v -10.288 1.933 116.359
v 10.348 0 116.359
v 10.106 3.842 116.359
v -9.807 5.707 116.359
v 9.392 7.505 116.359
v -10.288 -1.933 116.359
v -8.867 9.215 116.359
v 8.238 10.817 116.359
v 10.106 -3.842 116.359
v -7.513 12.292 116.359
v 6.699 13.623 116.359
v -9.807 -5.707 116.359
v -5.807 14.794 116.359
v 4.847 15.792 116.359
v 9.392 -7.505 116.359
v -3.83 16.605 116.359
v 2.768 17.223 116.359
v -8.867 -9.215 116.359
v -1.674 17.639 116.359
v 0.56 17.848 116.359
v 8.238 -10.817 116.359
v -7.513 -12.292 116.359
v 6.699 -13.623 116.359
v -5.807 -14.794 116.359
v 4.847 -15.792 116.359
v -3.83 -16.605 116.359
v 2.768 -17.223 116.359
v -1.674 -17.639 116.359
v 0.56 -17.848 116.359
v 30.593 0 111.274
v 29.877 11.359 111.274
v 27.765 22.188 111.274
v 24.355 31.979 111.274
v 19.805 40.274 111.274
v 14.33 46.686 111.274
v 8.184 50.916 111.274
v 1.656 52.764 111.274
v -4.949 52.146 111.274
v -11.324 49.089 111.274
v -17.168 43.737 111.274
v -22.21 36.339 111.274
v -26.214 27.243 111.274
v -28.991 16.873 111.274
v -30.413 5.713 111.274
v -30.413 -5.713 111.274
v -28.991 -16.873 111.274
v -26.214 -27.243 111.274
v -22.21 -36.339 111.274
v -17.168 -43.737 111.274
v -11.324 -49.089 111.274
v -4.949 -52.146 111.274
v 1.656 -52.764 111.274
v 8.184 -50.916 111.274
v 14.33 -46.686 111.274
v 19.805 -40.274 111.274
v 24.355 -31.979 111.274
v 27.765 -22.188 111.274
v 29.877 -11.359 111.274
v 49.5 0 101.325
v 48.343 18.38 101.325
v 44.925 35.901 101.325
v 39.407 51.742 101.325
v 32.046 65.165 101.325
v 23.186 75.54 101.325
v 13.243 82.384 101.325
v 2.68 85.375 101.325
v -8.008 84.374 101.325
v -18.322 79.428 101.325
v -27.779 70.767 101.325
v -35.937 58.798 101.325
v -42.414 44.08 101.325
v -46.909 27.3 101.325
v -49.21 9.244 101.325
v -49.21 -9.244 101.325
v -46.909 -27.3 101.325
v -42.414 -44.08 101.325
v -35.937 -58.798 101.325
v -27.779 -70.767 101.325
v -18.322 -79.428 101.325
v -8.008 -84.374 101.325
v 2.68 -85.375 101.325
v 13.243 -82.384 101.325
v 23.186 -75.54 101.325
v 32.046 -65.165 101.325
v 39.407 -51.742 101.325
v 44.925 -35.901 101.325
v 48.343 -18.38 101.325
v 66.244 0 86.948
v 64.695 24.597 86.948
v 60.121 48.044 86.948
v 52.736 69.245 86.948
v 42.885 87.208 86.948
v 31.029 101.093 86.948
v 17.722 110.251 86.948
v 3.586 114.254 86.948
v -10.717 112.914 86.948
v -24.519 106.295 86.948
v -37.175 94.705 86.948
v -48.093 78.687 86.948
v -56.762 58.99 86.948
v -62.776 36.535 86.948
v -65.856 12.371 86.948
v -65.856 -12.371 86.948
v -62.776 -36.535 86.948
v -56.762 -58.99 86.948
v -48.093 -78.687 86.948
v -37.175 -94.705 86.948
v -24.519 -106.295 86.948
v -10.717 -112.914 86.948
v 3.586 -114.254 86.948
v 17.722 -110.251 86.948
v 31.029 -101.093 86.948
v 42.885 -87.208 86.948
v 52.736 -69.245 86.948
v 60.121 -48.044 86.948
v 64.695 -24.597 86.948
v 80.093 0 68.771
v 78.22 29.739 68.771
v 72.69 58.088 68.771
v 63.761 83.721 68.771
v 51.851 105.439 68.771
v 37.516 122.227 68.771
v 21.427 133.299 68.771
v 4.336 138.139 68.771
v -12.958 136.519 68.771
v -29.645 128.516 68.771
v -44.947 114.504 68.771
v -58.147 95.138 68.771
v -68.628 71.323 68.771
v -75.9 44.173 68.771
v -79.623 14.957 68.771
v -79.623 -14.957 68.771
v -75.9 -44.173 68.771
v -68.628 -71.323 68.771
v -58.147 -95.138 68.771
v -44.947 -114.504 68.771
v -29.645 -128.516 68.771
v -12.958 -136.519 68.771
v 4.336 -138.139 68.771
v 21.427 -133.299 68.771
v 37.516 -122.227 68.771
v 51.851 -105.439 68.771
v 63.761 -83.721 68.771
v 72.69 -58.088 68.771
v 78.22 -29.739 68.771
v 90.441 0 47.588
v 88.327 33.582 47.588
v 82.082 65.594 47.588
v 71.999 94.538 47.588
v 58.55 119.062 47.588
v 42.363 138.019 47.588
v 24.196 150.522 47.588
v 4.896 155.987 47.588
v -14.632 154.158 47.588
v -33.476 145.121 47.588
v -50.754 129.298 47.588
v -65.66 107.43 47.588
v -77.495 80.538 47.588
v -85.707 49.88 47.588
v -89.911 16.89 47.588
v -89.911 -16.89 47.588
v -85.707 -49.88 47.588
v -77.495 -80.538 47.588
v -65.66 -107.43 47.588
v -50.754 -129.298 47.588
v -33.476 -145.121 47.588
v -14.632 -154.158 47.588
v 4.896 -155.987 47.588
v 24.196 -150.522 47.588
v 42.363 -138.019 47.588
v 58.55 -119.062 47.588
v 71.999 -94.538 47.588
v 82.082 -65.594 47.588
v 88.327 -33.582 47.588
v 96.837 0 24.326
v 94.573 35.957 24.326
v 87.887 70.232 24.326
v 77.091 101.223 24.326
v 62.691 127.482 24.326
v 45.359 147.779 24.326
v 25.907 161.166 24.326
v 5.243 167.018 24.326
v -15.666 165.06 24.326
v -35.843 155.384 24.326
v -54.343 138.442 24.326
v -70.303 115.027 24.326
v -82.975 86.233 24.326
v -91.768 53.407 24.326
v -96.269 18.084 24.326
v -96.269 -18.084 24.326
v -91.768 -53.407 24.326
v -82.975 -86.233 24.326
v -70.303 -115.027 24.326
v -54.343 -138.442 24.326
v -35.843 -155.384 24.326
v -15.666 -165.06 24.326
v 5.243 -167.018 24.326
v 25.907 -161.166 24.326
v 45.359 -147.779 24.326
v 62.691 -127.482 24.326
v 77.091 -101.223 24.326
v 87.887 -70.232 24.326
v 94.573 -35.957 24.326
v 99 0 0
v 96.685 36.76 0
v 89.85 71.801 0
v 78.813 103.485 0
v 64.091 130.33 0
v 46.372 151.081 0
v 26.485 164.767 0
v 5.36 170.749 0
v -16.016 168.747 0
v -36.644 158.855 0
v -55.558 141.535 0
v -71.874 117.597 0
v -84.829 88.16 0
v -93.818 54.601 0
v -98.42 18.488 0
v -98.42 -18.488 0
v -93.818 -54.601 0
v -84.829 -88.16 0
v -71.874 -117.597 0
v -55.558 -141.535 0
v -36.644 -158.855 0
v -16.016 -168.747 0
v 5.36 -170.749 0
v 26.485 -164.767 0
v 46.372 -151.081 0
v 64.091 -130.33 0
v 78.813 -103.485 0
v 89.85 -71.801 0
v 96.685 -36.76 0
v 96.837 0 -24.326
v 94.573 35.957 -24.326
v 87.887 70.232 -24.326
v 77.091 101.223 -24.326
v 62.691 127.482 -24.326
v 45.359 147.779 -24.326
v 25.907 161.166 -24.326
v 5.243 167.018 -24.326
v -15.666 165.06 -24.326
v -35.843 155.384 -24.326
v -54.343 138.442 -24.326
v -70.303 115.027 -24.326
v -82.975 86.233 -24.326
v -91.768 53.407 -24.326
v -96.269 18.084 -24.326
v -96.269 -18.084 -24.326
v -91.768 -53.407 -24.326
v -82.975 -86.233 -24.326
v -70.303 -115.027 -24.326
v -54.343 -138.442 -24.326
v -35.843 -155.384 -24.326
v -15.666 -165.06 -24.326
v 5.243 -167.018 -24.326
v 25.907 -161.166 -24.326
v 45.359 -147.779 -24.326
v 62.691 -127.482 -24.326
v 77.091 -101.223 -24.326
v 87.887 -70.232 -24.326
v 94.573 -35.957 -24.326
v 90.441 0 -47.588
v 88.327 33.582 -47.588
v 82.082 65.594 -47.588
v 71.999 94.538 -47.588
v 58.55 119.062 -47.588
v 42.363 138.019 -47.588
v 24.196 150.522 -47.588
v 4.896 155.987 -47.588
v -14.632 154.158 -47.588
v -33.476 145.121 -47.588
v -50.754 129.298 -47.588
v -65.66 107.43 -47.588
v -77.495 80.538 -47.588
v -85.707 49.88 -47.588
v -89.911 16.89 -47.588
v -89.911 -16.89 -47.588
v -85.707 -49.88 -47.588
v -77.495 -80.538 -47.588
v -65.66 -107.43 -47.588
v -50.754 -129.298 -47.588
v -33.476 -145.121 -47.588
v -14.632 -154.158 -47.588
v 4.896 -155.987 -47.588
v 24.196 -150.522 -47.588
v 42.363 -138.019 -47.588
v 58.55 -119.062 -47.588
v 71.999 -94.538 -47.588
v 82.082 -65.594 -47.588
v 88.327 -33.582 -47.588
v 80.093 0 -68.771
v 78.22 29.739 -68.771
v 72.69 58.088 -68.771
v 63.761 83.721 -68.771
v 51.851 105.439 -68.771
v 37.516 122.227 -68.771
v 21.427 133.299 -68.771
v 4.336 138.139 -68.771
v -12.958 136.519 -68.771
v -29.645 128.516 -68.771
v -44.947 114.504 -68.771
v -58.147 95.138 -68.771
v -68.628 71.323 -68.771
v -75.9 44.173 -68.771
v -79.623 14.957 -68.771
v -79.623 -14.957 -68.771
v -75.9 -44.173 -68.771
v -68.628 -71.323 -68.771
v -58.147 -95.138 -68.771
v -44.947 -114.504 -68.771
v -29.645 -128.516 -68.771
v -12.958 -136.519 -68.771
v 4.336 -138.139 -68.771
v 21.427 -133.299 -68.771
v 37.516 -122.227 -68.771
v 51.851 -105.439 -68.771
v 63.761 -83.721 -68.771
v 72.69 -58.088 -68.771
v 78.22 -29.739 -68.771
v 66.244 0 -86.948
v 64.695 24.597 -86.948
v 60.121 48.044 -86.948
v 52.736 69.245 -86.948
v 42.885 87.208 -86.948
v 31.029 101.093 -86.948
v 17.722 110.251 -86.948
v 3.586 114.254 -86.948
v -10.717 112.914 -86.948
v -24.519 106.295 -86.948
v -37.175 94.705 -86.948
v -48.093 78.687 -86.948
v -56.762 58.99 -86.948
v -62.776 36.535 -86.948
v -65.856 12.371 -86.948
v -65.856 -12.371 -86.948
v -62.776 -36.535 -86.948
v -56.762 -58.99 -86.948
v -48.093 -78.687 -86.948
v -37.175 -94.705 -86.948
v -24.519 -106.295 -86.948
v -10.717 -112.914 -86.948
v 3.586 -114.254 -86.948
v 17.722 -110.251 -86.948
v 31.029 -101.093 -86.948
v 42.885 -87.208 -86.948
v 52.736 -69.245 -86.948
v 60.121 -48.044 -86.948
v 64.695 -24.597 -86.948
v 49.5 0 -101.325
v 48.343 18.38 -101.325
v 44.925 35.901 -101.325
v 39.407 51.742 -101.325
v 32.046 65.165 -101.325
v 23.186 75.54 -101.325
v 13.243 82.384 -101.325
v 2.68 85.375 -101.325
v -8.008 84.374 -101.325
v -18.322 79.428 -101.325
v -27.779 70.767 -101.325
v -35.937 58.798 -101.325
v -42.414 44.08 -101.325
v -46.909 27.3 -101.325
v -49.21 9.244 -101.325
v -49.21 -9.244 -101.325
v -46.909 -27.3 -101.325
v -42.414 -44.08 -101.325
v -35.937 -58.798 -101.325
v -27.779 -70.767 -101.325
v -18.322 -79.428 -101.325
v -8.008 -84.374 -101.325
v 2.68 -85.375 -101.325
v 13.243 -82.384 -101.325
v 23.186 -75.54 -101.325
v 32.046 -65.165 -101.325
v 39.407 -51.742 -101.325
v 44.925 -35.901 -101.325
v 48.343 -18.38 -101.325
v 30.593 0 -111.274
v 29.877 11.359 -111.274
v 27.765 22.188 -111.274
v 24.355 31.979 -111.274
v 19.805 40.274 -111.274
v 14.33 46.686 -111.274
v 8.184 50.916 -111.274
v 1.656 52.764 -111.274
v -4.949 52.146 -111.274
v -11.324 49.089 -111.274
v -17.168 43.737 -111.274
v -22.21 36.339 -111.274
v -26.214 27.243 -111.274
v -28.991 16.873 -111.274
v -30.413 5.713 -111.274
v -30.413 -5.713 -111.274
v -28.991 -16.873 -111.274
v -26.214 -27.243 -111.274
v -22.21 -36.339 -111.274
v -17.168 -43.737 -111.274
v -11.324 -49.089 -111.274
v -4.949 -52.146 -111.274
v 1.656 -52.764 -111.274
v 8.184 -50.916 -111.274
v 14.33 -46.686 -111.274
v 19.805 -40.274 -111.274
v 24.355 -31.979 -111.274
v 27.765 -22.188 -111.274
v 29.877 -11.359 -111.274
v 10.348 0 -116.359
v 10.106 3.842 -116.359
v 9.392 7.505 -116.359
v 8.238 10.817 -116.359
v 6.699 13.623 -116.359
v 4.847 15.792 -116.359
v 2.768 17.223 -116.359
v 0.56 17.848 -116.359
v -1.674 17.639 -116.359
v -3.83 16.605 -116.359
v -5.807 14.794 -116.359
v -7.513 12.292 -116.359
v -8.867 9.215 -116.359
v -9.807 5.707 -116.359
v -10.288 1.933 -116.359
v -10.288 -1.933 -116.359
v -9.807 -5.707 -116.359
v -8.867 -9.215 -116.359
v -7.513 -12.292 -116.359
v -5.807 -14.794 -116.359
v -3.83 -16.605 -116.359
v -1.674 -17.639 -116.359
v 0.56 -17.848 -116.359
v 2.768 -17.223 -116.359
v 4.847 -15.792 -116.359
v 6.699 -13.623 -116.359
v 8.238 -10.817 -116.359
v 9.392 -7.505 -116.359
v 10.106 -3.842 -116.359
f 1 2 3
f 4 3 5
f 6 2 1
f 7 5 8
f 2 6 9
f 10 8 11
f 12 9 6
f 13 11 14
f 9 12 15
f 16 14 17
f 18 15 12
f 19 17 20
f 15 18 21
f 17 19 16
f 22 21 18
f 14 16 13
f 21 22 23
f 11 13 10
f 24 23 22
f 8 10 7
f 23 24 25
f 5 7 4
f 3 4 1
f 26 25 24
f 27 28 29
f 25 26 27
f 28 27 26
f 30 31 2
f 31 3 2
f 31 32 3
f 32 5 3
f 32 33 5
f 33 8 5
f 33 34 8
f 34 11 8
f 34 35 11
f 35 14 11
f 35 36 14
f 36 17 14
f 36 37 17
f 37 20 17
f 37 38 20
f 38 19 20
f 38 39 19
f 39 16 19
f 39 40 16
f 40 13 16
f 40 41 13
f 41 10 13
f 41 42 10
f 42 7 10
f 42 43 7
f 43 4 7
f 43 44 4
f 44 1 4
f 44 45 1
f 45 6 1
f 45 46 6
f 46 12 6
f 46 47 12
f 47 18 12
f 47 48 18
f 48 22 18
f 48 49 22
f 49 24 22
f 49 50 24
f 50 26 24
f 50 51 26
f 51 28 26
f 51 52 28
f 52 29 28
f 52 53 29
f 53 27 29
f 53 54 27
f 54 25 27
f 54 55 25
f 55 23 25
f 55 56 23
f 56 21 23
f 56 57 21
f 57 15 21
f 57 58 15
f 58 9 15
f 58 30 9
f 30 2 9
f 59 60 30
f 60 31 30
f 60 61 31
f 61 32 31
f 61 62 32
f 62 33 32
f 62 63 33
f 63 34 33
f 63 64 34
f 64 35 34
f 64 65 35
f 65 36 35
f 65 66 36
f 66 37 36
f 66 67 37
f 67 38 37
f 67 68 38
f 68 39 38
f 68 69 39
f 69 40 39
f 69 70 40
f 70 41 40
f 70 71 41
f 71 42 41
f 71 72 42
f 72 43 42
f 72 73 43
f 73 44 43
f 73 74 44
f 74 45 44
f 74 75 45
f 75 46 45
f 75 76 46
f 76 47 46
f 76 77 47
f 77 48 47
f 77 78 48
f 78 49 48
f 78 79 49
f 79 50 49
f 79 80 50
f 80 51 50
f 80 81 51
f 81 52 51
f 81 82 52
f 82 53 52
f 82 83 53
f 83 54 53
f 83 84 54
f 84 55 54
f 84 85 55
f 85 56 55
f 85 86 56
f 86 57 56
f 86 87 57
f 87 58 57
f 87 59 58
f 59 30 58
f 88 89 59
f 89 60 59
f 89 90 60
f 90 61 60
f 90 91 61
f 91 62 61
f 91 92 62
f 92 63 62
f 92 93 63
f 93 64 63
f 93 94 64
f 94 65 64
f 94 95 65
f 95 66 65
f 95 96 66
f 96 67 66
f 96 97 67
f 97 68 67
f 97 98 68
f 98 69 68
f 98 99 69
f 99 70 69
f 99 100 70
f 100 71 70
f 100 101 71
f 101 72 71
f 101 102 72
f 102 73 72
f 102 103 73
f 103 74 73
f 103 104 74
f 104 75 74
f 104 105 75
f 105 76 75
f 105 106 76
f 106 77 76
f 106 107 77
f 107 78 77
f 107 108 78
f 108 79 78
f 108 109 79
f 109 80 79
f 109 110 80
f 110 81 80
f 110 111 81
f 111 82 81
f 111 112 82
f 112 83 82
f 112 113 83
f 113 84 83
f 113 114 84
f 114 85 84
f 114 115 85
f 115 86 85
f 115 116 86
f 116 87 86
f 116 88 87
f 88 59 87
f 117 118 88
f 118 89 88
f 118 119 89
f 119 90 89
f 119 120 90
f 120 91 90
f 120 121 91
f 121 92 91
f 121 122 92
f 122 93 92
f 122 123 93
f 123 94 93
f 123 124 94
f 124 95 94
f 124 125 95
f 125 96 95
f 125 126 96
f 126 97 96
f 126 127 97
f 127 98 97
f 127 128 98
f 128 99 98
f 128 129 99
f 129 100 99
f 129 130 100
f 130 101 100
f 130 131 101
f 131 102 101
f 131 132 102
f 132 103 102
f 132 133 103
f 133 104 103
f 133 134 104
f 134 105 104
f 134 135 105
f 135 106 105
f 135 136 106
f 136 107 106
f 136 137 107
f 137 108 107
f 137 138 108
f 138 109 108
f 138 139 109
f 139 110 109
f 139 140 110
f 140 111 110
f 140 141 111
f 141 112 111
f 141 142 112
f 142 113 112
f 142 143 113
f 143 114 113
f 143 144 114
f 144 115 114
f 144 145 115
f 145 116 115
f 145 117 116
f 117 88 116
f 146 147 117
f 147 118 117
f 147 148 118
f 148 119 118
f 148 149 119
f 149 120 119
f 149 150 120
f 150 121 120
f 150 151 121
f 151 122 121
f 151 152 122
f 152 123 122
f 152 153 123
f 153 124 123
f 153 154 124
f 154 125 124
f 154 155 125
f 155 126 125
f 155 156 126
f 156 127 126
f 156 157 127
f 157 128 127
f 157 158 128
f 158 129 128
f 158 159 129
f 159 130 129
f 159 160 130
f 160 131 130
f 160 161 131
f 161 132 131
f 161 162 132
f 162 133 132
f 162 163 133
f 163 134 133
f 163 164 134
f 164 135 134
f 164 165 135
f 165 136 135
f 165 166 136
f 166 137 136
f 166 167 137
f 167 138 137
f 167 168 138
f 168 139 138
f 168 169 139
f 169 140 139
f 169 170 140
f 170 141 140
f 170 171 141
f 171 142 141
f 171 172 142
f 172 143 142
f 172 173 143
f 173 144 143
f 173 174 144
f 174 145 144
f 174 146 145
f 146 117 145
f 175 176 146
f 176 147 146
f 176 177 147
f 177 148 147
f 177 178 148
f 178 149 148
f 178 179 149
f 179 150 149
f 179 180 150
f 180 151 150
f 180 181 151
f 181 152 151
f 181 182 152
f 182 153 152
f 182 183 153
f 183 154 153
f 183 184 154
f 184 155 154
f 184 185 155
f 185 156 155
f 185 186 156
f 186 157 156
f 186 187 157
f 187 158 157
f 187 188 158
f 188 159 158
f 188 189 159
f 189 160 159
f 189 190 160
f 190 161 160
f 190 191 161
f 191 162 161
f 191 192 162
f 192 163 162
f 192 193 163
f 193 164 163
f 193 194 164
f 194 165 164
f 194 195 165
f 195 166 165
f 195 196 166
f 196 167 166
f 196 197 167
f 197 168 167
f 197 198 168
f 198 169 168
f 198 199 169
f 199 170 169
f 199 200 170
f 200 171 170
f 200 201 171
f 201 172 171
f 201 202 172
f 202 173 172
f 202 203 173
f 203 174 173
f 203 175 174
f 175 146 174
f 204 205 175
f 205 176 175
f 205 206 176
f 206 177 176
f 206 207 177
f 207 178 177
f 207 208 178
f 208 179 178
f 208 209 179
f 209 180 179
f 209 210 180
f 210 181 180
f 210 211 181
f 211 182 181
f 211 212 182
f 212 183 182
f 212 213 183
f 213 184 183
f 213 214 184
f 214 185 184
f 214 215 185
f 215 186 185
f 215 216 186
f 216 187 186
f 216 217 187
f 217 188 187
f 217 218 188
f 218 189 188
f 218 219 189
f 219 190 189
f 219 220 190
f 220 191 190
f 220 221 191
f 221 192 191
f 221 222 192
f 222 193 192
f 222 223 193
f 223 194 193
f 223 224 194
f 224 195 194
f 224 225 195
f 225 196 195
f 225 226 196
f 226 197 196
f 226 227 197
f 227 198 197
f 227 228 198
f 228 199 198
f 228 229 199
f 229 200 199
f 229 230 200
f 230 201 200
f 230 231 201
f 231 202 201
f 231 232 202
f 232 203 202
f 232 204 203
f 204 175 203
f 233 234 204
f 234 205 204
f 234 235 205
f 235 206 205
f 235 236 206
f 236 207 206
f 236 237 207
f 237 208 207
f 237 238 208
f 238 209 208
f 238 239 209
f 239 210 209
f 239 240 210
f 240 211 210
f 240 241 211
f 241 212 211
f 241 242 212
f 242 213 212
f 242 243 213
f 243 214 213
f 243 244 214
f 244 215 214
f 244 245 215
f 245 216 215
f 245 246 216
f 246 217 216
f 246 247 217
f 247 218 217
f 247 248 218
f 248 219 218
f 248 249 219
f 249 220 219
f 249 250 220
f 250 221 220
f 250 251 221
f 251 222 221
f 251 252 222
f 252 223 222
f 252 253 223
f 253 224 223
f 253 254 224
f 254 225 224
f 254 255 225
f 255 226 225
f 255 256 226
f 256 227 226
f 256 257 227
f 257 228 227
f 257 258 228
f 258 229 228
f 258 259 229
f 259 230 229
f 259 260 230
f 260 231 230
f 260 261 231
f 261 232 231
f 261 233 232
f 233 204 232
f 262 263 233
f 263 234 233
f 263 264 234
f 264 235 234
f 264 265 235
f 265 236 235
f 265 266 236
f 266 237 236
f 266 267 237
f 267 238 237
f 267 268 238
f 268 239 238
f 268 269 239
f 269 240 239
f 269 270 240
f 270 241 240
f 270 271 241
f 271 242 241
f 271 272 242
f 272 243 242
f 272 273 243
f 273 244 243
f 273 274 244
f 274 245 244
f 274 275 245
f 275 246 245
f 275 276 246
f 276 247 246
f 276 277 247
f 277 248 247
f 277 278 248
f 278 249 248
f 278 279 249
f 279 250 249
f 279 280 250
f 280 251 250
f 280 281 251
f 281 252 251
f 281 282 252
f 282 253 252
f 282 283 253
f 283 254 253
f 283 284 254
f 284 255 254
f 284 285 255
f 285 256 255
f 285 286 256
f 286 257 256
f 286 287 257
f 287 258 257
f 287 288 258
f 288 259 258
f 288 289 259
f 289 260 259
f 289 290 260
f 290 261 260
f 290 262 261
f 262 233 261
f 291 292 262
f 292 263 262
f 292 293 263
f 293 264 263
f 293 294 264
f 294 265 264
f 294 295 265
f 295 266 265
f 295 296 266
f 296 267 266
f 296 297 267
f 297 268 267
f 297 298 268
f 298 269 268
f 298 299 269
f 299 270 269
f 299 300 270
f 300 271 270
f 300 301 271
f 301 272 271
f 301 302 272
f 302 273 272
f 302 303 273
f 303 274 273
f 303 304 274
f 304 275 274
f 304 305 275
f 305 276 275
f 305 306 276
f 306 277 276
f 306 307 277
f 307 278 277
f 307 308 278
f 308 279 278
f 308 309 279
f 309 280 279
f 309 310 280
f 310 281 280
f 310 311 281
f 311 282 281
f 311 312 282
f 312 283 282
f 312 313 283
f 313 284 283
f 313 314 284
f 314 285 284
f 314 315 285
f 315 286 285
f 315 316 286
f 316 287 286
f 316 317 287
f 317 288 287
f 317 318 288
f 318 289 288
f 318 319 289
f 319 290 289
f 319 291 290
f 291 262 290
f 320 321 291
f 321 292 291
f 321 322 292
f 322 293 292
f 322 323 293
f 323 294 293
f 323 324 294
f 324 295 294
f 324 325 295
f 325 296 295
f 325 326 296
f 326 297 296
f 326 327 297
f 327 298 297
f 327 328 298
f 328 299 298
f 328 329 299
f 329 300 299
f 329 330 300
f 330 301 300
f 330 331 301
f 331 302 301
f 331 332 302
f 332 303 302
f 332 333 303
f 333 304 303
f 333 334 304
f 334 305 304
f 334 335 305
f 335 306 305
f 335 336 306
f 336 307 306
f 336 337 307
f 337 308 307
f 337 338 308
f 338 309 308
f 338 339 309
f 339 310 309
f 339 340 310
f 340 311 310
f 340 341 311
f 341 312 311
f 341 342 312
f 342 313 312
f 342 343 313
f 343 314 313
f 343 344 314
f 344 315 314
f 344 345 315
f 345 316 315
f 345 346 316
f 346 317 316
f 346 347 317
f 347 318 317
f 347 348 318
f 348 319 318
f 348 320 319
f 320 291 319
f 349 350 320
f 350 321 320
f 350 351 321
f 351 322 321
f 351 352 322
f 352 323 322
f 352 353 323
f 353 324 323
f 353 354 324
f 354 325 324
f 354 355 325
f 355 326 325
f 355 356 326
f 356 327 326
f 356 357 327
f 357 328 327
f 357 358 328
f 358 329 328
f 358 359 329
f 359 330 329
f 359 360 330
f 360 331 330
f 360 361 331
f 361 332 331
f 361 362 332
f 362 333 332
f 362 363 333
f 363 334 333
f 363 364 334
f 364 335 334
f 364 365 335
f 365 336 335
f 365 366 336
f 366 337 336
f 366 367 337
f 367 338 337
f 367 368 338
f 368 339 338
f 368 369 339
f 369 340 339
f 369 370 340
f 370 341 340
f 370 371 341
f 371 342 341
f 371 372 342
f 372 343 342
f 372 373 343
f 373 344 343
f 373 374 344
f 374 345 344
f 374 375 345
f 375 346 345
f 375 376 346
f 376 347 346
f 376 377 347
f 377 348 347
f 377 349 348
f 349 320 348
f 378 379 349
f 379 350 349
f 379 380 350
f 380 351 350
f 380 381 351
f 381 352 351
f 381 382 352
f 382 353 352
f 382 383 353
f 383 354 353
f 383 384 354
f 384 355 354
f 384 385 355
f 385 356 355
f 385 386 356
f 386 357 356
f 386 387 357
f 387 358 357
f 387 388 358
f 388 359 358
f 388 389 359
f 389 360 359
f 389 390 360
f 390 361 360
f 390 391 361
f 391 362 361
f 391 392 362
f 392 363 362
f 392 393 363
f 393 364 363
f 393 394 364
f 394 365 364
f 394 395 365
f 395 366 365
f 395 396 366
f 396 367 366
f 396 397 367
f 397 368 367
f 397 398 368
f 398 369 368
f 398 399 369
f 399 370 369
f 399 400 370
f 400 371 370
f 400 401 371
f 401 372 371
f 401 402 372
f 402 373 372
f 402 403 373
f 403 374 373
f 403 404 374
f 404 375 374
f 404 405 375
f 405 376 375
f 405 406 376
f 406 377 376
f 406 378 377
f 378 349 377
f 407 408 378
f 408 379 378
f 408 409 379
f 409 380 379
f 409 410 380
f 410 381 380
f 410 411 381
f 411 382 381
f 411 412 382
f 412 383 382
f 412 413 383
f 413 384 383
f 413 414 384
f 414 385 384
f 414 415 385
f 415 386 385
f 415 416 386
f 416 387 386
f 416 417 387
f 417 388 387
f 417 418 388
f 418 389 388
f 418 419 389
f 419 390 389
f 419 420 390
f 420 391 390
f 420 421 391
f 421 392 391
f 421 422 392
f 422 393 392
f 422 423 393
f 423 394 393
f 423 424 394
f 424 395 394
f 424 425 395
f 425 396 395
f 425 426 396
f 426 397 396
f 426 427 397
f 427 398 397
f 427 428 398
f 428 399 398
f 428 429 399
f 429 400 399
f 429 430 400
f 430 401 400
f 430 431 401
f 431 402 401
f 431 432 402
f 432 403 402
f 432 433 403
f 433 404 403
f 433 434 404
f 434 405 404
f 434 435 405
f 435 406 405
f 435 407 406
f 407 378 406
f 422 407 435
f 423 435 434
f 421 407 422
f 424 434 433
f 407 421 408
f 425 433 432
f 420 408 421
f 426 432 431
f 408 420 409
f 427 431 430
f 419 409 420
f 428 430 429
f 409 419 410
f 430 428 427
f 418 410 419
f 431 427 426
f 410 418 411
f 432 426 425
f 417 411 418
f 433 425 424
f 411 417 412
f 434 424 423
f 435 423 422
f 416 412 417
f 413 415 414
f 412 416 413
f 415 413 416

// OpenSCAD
// Generated by SolidPython 1.0.1 on 2020-07-29 00:46:50


scale(v = [11, 19, 13]) {
	sphere(r = 9);
}
/***********************************************
*********      SolidPython code:      **********
************************************************
 
# import packages: SolidPython
from solid import *
from solid.utils import *
from itertools import chain, combinations, permutations


class Resize:

    def __init__(self, scad_file):
        self.scad_file = scad_file
        #self.scad_file = import_scad(scad_file)
        # cone/cylinder param:
        self.r1 = 0
        self.r2 = 0
        self.h = 0
        # rectangular prism param:
        self.w = 0
        self.l = 0
        # ellipse param:
        self.r = 0

    # import OpenScad code (file name corresponds to shape)


    # classify shape + parameters
    def assign(self, param1, param2, param3):
        if self.scad_file == 'cone.scad':
            self.r1 = param1
            self.r2 = param2
            self.h = param3
        elif self.scad_file == 'cylinder.scad':
            self.r1 = param1
            self.r2 = param2
            self.h = param3
        elif self.scad_file == 'rectangularPrism.scad':
            self.h = param1
            self.l = param2
            self.w = param3
        else:
            self.r = param1
            self.h = param2

    # resize parameters
    def iterate(self):
        x = range(3, 20, 2)
        i = 1
        if self.scad_file == 'cone.scad':
            tempList = list(permutations(x, 2))
            for temp in tempList:
                param1 = temp[0]
                param2 = temp[1]
                filepath = 'produced_scad_files/' + 'cone' + str(param1) + '_' + str(param2) + '_' + '.scad'
                scad_render_to_file(cylinder(h=param1, r1=param2, r2=0), filepath)

        elif self.scad_file == 'cylinder.scad':
            tempList = list(permutations(x, 3))
            for temp in tempList:
                param1 = temp[0]
                param2 = temp[1]
                filepath = 'produced_scad_files/' + 'cylinder' + str(param1) + '_' + str(param2) + '_' + '.scad'
                scad_render_to_file(cylinder(h=param1, r1=param2, r2=param2), filepath)

        elif self.scad_file == 'rectangularPrism.scad':
            tempList = list(permutations(x, 3))
            for temp in tempList:
                param1 = temp[0]
                param2 = temp[1]
                param3 = temp[2]
                filepath = 'produced_scad_files/' + 'rectangularPrism' + str(param1) + '_' + str(param2) + '_' + str(
                    param3) + '.scad'
                scad_render_to_file(cube(size=(param1, param2, param3)), filepath)

        elif self.scad_file == 'ellipse.scad':
            tempList = list(permutations(x, 4))
            for temp in tempList:
                param1 = temp[0]
                param2 = temp[1]
                param3 = temp[2]
                param4 = temp[3]
                filepath = 'produced_scad_files/' + 'ellipse' + str(param1) + '_' + str(param2) + '_' + str(param3) + '_' + str(param4) + '.scad'
                scad_render_to_file(scale([param1, param2, param3])(sphere(r=param4)), filepath)

    def render_to_scadfile(self):
        scad_render_to_file(scad, 'example.scad') 
 
************************************************/
